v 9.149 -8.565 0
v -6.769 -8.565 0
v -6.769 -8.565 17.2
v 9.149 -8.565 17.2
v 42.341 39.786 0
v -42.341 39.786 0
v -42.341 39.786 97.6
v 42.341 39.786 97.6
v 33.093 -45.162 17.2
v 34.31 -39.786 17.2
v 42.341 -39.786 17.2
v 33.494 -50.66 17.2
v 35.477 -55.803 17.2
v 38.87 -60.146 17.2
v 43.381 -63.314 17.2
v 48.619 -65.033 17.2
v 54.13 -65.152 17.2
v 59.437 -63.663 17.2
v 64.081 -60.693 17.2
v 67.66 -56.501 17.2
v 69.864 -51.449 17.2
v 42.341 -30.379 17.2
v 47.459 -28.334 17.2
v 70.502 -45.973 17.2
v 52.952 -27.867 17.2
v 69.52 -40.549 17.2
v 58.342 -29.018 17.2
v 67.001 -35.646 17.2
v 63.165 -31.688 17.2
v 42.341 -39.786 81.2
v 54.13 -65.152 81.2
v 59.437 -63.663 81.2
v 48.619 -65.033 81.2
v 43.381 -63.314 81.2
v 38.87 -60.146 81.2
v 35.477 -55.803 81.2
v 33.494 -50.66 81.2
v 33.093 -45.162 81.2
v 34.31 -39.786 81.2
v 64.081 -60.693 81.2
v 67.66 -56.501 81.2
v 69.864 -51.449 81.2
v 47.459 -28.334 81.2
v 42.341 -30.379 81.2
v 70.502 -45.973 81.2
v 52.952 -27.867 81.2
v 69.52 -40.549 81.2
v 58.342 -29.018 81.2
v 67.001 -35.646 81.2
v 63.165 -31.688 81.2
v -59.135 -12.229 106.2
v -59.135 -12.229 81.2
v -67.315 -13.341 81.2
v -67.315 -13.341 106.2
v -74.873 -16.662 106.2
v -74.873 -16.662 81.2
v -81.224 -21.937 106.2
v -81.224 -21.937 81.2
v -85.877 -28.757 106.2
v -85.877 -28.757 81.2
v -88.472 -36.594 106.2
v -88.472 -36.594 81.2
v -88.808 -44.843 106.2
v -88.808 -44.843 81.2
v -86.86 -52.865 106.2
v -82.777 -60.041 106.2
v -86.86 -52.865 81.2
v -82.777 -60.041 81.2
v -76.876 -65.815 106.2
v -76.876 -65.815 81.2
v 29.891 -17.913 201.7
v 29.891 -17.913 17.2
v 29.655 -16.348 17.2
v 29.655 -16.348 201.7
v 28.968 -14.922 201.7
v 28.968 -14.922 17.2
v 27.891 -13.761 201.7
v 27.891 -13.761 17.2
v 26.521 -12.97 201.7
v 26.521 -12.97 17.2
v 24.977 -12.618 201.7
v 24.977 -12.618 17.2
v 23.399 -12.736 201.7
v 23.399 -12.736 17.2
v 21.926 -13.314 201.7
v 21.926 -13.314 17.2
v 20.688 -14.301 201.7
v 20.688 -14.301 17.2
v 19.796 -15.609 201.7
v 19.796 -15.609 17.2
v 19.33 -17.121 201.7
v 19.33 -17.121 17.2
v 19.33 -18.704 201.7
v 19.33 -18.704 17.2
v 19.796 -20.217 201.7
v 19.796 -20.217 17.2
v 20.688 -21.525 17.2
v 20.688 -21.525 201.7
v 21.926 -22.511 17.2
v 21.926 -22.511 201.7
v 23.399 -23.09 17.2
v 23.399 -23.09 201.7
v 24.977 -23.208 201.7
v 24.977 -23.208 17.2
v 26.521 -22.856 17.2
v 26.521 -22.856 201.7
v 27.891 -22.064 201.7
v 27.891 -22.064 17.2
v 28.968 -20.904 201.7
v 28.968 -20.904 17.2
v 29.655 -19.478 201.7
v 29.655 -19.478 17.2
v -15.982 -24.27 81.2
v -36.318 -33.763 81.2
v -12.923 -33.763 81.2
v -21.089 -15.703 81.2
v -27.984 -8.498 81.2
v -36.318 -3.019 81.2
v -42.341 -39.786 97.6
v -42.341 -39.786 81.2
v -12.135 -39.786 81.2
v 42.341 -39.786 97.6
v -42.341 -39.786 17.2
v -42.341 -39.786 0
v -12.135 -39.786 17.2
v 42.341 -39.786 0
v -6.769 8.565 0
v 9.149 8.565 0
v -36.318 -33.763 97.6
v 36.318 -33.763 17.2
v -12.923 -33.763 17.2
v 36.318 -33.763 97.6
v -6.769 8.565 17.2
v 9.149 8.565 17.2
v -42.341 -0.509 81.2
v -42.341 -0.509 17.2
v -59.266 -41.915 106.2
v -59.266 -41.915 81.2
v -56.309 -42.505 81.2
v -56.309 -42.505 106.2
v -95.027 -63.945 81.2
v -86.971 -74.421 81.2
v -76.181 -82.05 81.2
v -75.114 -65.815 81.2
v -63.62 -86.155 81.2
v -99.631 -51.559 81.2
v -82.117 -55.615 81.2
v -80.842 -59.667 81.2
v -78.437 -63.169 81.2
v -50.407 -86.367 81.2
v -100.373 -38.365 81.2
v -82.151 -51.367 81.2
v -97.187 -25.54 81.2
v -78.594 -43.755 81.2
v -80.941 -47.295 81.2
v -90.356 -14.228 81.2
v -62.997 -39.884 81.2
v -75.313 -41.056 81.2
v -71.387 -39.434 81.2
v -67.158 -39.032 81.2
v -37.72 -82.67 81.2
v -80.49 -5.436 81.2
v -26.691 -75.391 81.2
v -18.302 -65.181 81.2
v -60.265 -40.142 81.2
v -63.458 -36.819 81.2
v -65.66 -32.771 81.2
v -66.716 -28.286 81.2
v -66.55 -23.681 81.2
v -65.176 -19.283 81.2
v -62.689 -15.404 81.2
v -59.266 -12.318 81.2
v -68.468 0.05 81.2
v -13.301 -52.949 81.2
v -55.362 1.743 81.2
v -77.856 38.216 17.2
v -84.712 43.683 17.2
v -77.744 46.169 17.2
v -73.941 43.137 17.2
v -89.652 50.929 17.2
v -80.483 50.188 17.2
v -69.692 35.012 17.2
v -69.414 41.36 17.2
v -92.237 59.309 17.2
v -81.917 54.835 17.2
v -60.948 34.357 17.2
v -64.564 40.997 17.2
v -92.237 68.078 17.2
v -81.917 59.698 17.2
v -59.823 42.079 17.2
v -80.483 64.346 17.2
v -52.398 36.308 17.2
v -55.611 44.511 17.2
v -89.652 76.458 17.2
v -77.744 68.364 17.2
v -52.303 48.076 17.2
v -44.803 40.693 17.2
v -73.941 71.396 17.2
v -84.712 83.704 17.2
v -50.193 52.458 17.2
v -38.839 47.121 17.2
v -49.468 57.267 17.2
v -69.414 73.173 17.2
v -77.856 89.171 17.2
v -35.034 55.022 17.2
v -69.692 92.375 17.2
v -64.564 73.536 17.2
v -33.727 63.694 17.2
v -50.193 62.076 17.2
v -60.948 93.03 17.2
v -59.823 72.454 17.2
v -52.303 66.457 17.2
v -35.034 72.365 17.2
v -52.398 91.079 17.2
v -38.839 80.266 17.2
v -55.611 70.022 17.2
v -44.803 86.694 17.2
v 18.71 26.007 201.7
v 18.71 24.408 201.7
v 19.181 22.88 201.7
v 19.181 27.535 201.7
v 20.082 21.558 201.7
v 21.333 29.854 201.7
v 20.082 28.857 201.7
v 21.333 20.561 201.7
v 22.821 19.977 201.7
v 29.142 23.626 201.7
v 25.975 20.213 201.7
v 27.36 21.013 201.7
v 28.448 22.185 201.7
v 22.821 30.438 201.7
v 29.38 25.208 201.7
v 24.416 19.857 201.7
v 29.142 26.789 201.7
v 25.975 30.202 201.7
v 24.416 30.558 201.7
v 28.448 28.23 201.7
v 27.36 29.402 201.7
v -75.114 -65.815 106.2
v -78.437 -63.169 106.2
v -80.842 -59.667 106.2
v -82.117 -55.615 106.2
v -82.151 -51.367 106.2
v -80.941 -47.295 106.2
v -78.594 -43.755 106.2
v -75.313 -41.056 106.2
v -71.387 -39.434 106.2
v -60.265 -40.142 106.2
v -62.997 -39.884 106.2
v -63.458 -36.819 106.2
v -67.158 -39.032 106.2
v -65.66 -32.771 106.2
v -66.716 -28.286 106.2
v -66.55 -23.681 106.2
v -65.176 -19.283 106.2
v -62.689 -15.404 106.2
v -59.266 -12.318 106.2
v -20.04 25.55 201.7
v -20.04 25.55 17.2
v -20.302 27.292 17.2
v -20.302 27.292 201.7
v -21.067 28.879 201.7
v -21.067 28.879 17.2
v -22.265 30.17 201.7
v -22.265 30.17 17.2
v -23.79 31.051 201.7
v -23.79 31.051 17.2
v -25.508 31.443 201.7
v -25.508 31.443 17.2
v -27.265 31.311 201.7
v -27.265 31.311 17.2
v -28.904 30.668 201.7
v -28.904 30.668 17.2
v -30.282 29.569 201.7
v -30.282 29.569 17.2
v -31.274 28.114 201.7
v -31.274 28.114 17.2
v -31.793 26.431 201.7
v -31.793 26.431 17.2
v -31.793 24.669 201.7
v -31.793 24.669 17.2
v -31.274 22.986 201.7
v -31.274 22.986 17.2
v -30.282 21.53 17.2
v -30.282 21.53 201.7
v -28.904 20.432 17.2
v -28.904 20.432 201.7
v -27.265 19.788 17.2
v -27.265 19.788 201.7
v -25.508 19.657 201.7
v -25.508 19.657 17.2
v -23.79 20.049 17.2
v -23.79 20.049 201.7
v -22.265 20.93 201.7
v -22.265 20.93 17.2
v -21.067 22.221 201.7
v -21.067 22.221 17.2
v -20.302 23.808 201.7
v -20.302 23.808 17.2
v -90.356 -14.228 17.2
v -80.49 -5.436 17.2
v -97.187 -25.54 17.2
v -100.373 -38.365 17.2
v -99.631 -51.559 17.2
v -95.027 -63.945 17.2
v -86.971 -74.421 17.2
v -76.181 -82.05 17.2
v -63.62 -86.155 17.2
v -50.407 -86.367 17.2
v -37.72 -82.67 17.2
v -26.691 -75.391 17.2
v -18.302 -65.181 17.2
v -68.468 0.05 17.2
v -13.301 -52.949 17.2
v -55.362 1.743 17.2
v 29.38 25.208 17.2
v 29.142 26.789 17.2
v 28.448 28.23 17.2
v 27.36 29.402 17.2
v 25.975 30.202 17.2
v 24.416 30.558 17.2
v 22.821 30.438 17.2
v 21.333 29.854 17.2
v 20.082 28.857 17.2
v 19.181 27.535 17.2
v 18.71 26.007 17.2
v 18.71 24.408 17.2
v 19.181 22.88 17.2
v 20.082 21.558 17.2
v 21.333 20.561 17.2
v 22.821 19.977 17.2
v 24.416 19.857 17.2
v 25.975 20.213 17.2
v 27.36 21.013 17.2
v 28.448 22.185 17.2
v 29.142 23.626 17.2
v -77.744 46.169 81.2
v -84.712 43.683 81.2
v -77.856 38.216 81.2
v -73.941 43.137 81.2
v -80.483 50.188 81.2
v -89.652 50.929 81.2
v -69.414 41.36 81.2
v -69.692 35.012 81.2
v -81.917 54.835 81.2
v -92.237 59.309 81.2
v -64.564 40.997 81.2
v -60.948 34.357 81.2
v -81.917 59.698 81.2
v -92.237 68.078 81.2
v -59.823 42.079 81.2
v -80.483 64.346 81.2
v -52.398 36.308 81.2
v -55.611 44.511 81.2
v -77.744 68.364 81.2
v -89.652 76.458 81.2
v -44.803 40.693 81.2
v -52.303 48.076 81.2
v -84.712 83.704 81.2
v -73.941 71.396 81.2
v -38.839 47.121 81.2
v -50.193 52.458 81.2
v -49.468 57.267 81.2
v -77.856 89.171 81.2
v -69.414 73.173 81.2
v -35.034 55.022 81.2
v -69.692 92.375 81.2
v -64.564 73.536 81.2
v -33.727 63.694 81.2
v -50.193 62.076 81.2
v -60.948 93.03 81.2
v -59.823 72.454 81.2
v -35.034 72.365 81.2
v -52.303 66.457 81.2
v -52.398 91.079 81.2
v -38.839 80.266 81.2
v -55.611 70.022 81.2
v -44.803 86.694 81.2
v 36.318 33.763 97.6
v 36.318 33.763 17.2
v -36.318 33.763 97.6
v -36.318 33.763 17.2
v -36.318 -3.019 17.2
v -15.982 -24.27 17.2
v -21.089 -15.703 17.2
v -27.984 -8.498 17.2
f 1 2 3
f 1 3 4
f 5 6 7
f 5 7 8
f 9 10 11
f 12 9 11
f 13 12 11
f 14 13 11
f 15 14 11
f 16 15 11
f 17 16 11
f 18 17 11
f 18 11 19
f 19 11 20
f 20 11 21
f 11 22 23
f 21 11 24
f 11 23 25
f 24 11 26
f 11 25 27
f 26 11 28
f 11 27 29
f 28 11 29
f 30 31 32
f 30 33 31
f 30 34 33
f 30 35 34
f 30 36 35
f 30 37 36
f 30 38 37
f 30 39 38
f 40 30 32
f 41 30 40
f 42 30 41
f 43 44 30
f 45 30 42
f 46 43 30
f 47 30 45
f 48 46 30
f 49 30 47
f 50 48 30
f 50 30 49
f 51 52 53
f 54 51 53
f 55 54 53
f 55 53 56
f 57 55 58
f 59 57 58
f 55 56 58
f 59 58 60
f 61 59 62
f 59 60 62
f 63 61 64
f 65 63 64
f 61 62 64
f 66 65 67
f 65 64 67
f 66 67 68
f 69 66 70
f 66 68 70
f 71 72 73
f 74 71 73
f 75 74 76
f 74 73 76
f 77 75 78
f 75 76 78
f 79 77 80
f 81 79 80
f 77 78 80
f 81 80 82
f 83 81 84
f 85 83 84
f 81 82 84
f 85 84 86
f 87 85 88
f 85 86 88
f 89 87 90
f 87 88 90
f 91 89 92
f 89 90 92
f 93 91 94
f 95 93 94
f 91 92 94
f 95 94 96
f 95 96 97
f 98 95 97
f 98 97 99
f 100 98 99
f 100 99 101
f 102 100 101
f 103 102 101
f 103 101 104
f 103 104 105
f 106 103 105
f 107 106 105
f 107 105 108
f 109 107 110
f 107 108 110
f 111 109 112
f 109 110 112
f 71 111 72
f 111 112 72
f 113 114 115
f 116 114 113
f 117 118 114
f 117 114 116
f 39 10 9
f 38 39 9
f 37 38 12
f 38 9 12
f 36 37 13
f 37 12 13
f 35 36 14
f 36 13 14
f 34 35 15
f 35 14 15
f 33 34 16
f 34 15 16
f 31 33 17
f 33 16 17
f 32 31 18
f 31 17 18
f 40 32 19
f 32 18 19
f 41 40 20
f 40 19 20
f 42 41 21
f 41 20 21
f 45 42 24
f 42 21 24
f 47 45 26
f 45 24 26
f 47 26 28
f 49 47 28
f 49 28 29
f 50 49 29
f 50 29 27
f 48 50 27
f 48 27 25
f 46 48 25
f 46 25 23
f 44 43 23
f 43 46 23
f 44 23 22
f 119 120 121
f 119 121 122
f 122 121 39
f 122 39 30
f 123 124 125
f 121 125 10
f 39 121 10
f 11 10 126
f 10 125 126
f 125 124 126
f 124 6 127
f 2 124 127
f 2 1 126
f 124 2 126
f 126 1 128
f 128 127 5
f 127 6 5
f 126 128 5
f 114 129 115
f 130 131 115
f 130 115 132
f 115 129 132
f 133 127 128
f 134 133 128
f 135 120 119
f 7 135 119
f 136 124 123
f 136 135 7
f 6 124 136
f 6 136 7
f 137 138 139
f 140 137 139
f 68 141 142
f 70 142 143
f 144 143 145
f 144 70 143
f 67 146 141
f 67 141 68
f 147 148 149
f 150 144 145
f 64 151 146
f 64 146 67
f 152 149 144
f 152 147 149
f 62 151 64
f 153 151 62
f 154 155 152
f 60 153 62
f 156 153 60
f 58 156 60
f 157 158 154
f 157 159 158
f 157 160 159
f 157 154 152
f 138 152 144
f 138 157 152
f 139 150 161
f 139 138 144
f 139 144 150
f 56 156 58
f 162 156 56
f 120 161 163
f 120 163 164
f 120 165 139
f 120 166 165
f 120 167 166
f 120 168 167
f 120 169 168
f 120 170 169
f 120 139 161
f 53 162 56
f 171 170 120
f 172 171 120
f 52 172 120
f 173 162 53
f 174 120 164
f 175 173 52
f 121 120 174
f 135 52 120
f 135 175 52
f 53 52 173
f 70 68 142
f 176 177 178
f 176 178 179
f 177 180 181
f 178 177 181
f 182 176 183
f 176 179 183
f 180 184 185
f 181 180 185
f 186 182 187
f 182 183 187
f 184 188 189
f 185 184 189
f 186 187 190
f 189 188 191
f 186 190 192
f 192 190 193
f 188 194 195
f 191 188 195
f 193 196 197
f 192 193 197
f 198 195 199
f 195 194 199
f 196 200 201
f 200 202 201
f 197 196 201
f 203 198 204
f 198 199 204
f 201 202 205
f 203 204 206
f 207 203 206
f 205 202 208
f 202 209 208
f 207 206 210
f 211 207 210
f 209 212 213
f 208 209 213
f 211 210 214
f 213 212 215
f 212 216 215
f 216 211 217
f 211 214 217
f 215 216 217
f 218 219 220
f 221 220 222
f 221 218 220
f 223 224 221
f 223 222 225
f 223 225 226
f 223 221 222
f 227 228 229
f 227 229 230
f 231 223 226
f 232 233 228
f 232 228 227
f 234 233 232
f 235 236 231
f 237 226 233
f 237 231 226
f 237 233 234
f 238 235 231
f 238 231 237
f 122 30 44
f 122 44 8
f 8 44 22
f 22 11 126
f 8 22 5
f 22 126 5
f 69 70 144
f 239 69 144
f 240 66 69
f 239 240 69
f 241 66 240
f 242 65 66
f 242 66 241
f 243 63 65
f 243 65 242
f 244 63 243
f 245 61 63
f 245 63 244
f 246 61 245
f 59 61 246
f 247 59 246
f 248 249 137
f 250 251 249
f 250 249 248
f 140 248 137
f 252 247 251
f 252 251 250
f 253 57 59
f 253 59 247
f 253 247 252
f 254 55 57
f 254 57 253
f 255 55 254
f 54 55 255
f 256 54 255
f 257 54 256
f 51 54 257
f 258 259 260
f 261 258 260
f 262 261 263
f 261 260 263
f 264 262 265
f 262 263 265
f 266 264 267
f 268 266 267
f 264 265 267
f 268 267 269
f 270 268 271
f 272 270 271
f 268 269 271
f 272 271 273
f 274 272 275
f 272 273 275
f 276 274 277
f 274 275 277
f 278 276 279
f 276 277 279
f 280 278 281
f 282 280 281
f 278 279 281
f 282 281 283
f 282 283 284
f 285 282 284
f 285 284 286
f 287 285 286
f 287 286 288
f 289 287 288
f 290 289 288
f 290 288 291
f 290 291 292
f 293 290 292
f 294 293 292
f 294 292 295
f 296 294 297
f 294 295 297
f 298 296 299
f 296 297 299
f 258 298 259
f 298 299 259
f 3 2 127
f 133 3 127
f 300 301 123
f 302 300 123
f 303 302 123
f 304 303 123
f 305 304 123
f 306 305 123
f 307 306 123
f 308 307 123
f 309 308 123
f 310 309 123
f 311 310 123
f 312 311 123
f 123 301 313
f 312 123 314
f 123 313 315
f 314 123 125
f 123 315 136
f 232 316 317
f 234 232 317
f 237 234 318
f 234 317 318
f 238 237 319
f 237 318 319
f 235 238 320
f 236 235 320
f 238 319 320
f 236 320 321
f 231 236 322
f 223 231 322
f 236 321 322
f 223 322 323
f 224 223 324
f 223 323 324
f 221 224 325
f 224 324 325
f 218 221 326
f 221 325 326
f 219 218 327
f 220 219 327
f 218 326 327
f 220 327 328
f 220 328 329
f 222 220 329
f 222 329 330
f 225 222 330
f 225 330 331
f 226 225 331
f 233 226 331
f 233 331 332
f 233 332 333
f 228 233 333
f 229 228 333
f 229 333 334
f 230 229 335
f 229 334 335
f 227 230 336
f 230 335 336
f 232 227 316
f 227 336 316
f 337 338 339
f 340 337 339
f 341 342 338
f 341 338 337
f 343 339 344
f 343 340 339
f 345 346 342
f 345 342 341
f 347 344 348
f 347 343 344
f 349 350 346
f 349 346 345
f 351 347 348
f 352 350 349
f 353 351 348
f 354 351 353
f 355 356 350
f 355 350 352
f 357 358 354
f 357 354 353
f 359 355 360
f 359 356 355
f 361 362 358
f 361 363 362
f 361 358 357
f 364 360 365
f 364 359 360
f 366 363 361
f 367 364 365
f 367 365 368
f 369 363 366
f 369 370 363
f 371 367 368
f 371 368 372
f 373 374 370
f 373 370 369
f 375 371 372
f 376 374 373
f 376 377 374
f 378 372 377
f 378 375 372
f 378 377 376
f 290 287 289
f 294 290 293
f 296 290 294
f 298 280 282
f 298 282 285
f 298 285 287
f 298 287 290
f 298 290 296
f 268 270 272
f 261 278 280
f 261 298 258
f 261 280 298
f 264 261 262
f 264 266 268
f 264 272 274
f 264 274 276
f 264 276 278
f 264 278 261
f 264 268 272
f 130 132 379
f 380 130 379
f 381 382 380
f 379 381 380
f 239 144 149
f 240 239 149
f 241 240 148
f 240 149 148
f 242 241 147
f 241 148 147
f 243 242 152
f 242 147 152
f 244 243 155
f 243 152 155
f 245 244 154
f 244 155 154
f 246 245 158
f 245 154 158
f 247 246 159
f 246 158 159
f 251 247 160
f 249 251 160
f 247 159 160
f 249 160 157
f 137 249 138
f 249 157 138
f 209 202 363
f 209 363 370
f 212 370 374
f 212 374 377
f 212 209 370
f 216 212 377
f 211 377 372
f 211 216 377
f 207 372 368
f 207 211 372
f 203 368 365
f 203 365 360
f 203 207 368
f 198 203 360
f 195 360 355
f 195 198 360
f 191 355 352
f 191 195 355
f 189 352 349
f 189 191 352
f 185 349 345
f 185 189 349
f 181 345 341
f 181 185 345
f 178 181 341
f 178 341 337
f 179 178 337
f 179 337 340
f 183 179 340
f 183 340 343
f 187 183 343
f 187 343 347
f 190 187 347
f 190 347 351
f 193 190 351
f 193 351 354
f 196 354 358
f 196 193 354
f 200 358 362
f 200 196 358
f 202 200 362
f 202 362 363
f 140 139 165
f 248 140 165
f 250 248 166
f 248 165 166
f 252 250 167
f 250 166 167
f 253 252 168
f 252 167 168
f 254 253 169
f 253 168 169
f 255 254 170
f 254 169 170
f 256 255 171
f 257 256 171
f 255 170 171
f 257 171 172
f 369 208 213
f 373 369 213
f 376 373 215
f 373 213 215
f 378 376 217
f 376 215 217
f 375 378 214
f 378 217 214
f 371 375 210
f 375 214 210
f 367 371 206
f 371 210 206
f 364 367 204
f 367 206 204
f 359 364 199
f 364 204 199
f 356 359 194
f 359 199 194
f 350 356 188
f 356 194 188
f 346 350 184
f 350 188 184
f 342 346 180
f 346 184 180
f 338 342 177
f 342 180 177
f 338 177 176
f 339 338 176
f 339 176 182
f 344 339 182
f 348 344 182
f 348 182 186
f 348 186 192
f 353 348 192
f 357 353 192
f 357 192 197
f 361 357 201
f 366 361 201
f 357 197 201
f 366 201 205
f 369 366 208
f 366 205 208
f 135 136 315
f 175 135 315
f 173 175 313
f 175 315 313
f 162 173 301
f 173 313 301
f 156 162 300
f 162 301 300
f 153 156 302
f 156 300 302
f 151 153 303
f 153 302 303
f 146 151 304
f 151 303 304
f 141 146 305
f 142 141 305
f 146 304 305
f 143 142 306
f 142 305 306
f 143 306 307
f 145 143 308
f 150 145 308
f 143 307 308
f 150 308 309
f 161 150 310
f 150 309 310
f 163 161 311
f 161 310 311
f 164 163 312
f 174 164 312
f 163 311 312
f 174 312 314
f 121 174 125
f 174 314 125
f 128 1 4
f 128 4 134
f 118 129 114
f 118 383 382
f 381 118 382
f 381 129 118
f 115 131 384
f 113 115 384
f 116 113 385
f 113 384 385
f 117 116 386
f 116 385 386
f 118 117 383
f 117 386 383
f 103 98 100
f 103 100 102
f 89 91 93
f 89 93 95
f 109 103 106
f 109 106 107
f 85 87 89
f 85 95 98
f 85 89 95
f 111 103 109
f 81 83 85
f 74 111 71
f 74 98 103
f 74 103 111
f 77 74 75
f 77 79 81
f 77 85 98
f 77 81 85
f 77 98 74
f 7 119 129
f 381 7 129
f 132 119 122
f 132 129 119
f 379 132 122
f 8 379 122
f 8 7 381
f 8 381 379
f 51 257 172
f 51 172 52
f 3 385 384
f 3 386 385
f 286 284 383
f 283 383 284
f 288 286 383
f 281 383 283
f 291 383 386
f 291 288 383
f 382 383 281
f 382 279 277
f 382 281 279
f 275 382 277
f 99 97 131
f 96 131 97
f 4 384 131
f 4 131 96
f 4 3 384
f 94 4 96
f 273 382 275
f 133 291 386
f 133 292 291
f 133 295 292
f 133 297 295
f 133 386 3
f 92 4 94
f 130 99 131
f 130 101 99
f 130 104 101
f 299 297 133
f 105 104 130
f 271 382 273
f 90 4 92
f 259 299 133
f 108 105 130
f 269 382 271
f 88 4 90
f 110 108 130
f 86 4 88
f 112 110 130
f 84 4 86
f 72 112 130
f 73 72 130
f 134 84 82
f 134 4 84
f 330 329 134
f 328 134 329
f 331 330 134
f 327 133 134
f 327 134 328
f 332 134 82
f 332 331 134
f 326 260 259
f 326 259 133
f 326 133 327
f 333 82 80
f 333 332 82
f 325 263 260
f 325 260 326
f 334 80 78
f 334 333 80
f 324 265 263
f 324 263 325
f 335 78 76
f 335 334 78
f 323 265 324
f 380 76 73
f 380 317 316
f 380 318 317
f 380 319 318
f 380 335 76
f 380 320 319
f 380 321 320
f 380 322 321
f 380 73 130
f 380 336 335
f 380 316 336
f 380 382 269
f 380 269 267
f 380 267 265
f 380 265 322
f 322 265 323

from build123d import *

# Parameters (mm, degrees)
F0_W      = 84.681348
F0_H      = 79.57127
F1_DEPTH  = 97.6
F2_W      = 72.63615
F2_H      = 67.526072
F3_DEPTH  = 80.4
F4_W      = 15.918285
F4_H      = 17.129506
F5_DEPTH  = 25
F6_R      = 29.419222
F6_R_2    = 16.315322
F6_R_3    = 18.735501
F6_R_4    = 44.258048
F7_DEPTH  = 64
F9_DEPTH  = 25
F10_R     = 5.909634
F10_R_2   = 5.365188
F10_R_3   = 5.310057
F11_DEPTH = 184.5


with BuildPart() as f1:
    # F0 (on Top) → F1 (new body)
    with BuildSketch(Plane.XY):
        Rectangle(F0_W, F0_H)
    extrude(amount=F1_DEPTH)

    # F2 (on face) → F3 (cut)
    with BuildSketch(Plane.XY.offset(97.6)):
        Rectangle(F2_W, F2_H)
    extrude(amount=-F3_DEPTH, mode=Mode.SUBTRACT)

    # F4 (on face) → F5 (cut)
    with BuildSketch(Plane.XY.offset(17.2)):
        with Locations((1.189717, 0)):
            Rectangle(F4_W, F4_H)
    extrude(amount=-F5_DEPTH, mode=Mode.SUBTRACT)

    # F6 (on face) → F7 (join)
    with BuildSketch(Plane.XY.offset(17.2)):
        with Locations((-63.14601, 63.693516)):
            Circle(F6_R)
        with Locations((-65.783553, 57.266586)):
            Circle(F6_R_2, mode=Mode.SUBTRACT)
        with Locations((51.776342, -46.565104)):
            Circle(F6_R_3)
        with Locations((-56.309156, -42.504646)):
            Circle(F6_R_4)
    extrude(amount=F7_DEPTH)

    # F8 (on face) → F9 (join)
    with BuildSketch(Plane.XY.offset(81.2)):
        with BuildLine():
            Line((-59.266231, -12.31808), (-59.134718, -12.228968))
            ThreePointArc((-59.134718, -12.228968), (-87.44846, -32.584632), (-76.876305, -65.814897))
            Line((-76.876305, -65.814897), (-75.113826, -65.814897))
            ThreePointArc((-75.113826, -65.814897), (-79.899161, -45.437809), (-59.266231, -41.915392))
            Line((-59.266231, -41.915392), (-56.309156, -42.504646))
            ThreePointArc((-56.309156, -42.504646), (-66.71571, -28.285951), (-59.266231, -12.31808))
        make_face()
    extrude(amount=F9_DEPTH)

    # F10 (on face) → F11 (join)
    with BuildSketch(Plane.XY.offset(17.2)):
        with Locations((-25.949495, 25.54986)):
            Circle(F10_R)
        with Locations((24.015264, 25.207581)):
            Circle(F10_R_2)
        with Locations((24.580577, -17.912829)):
            Circle(F10_R_3)
    extrude(amount=F11_DEPTH)


solid = f1.part
